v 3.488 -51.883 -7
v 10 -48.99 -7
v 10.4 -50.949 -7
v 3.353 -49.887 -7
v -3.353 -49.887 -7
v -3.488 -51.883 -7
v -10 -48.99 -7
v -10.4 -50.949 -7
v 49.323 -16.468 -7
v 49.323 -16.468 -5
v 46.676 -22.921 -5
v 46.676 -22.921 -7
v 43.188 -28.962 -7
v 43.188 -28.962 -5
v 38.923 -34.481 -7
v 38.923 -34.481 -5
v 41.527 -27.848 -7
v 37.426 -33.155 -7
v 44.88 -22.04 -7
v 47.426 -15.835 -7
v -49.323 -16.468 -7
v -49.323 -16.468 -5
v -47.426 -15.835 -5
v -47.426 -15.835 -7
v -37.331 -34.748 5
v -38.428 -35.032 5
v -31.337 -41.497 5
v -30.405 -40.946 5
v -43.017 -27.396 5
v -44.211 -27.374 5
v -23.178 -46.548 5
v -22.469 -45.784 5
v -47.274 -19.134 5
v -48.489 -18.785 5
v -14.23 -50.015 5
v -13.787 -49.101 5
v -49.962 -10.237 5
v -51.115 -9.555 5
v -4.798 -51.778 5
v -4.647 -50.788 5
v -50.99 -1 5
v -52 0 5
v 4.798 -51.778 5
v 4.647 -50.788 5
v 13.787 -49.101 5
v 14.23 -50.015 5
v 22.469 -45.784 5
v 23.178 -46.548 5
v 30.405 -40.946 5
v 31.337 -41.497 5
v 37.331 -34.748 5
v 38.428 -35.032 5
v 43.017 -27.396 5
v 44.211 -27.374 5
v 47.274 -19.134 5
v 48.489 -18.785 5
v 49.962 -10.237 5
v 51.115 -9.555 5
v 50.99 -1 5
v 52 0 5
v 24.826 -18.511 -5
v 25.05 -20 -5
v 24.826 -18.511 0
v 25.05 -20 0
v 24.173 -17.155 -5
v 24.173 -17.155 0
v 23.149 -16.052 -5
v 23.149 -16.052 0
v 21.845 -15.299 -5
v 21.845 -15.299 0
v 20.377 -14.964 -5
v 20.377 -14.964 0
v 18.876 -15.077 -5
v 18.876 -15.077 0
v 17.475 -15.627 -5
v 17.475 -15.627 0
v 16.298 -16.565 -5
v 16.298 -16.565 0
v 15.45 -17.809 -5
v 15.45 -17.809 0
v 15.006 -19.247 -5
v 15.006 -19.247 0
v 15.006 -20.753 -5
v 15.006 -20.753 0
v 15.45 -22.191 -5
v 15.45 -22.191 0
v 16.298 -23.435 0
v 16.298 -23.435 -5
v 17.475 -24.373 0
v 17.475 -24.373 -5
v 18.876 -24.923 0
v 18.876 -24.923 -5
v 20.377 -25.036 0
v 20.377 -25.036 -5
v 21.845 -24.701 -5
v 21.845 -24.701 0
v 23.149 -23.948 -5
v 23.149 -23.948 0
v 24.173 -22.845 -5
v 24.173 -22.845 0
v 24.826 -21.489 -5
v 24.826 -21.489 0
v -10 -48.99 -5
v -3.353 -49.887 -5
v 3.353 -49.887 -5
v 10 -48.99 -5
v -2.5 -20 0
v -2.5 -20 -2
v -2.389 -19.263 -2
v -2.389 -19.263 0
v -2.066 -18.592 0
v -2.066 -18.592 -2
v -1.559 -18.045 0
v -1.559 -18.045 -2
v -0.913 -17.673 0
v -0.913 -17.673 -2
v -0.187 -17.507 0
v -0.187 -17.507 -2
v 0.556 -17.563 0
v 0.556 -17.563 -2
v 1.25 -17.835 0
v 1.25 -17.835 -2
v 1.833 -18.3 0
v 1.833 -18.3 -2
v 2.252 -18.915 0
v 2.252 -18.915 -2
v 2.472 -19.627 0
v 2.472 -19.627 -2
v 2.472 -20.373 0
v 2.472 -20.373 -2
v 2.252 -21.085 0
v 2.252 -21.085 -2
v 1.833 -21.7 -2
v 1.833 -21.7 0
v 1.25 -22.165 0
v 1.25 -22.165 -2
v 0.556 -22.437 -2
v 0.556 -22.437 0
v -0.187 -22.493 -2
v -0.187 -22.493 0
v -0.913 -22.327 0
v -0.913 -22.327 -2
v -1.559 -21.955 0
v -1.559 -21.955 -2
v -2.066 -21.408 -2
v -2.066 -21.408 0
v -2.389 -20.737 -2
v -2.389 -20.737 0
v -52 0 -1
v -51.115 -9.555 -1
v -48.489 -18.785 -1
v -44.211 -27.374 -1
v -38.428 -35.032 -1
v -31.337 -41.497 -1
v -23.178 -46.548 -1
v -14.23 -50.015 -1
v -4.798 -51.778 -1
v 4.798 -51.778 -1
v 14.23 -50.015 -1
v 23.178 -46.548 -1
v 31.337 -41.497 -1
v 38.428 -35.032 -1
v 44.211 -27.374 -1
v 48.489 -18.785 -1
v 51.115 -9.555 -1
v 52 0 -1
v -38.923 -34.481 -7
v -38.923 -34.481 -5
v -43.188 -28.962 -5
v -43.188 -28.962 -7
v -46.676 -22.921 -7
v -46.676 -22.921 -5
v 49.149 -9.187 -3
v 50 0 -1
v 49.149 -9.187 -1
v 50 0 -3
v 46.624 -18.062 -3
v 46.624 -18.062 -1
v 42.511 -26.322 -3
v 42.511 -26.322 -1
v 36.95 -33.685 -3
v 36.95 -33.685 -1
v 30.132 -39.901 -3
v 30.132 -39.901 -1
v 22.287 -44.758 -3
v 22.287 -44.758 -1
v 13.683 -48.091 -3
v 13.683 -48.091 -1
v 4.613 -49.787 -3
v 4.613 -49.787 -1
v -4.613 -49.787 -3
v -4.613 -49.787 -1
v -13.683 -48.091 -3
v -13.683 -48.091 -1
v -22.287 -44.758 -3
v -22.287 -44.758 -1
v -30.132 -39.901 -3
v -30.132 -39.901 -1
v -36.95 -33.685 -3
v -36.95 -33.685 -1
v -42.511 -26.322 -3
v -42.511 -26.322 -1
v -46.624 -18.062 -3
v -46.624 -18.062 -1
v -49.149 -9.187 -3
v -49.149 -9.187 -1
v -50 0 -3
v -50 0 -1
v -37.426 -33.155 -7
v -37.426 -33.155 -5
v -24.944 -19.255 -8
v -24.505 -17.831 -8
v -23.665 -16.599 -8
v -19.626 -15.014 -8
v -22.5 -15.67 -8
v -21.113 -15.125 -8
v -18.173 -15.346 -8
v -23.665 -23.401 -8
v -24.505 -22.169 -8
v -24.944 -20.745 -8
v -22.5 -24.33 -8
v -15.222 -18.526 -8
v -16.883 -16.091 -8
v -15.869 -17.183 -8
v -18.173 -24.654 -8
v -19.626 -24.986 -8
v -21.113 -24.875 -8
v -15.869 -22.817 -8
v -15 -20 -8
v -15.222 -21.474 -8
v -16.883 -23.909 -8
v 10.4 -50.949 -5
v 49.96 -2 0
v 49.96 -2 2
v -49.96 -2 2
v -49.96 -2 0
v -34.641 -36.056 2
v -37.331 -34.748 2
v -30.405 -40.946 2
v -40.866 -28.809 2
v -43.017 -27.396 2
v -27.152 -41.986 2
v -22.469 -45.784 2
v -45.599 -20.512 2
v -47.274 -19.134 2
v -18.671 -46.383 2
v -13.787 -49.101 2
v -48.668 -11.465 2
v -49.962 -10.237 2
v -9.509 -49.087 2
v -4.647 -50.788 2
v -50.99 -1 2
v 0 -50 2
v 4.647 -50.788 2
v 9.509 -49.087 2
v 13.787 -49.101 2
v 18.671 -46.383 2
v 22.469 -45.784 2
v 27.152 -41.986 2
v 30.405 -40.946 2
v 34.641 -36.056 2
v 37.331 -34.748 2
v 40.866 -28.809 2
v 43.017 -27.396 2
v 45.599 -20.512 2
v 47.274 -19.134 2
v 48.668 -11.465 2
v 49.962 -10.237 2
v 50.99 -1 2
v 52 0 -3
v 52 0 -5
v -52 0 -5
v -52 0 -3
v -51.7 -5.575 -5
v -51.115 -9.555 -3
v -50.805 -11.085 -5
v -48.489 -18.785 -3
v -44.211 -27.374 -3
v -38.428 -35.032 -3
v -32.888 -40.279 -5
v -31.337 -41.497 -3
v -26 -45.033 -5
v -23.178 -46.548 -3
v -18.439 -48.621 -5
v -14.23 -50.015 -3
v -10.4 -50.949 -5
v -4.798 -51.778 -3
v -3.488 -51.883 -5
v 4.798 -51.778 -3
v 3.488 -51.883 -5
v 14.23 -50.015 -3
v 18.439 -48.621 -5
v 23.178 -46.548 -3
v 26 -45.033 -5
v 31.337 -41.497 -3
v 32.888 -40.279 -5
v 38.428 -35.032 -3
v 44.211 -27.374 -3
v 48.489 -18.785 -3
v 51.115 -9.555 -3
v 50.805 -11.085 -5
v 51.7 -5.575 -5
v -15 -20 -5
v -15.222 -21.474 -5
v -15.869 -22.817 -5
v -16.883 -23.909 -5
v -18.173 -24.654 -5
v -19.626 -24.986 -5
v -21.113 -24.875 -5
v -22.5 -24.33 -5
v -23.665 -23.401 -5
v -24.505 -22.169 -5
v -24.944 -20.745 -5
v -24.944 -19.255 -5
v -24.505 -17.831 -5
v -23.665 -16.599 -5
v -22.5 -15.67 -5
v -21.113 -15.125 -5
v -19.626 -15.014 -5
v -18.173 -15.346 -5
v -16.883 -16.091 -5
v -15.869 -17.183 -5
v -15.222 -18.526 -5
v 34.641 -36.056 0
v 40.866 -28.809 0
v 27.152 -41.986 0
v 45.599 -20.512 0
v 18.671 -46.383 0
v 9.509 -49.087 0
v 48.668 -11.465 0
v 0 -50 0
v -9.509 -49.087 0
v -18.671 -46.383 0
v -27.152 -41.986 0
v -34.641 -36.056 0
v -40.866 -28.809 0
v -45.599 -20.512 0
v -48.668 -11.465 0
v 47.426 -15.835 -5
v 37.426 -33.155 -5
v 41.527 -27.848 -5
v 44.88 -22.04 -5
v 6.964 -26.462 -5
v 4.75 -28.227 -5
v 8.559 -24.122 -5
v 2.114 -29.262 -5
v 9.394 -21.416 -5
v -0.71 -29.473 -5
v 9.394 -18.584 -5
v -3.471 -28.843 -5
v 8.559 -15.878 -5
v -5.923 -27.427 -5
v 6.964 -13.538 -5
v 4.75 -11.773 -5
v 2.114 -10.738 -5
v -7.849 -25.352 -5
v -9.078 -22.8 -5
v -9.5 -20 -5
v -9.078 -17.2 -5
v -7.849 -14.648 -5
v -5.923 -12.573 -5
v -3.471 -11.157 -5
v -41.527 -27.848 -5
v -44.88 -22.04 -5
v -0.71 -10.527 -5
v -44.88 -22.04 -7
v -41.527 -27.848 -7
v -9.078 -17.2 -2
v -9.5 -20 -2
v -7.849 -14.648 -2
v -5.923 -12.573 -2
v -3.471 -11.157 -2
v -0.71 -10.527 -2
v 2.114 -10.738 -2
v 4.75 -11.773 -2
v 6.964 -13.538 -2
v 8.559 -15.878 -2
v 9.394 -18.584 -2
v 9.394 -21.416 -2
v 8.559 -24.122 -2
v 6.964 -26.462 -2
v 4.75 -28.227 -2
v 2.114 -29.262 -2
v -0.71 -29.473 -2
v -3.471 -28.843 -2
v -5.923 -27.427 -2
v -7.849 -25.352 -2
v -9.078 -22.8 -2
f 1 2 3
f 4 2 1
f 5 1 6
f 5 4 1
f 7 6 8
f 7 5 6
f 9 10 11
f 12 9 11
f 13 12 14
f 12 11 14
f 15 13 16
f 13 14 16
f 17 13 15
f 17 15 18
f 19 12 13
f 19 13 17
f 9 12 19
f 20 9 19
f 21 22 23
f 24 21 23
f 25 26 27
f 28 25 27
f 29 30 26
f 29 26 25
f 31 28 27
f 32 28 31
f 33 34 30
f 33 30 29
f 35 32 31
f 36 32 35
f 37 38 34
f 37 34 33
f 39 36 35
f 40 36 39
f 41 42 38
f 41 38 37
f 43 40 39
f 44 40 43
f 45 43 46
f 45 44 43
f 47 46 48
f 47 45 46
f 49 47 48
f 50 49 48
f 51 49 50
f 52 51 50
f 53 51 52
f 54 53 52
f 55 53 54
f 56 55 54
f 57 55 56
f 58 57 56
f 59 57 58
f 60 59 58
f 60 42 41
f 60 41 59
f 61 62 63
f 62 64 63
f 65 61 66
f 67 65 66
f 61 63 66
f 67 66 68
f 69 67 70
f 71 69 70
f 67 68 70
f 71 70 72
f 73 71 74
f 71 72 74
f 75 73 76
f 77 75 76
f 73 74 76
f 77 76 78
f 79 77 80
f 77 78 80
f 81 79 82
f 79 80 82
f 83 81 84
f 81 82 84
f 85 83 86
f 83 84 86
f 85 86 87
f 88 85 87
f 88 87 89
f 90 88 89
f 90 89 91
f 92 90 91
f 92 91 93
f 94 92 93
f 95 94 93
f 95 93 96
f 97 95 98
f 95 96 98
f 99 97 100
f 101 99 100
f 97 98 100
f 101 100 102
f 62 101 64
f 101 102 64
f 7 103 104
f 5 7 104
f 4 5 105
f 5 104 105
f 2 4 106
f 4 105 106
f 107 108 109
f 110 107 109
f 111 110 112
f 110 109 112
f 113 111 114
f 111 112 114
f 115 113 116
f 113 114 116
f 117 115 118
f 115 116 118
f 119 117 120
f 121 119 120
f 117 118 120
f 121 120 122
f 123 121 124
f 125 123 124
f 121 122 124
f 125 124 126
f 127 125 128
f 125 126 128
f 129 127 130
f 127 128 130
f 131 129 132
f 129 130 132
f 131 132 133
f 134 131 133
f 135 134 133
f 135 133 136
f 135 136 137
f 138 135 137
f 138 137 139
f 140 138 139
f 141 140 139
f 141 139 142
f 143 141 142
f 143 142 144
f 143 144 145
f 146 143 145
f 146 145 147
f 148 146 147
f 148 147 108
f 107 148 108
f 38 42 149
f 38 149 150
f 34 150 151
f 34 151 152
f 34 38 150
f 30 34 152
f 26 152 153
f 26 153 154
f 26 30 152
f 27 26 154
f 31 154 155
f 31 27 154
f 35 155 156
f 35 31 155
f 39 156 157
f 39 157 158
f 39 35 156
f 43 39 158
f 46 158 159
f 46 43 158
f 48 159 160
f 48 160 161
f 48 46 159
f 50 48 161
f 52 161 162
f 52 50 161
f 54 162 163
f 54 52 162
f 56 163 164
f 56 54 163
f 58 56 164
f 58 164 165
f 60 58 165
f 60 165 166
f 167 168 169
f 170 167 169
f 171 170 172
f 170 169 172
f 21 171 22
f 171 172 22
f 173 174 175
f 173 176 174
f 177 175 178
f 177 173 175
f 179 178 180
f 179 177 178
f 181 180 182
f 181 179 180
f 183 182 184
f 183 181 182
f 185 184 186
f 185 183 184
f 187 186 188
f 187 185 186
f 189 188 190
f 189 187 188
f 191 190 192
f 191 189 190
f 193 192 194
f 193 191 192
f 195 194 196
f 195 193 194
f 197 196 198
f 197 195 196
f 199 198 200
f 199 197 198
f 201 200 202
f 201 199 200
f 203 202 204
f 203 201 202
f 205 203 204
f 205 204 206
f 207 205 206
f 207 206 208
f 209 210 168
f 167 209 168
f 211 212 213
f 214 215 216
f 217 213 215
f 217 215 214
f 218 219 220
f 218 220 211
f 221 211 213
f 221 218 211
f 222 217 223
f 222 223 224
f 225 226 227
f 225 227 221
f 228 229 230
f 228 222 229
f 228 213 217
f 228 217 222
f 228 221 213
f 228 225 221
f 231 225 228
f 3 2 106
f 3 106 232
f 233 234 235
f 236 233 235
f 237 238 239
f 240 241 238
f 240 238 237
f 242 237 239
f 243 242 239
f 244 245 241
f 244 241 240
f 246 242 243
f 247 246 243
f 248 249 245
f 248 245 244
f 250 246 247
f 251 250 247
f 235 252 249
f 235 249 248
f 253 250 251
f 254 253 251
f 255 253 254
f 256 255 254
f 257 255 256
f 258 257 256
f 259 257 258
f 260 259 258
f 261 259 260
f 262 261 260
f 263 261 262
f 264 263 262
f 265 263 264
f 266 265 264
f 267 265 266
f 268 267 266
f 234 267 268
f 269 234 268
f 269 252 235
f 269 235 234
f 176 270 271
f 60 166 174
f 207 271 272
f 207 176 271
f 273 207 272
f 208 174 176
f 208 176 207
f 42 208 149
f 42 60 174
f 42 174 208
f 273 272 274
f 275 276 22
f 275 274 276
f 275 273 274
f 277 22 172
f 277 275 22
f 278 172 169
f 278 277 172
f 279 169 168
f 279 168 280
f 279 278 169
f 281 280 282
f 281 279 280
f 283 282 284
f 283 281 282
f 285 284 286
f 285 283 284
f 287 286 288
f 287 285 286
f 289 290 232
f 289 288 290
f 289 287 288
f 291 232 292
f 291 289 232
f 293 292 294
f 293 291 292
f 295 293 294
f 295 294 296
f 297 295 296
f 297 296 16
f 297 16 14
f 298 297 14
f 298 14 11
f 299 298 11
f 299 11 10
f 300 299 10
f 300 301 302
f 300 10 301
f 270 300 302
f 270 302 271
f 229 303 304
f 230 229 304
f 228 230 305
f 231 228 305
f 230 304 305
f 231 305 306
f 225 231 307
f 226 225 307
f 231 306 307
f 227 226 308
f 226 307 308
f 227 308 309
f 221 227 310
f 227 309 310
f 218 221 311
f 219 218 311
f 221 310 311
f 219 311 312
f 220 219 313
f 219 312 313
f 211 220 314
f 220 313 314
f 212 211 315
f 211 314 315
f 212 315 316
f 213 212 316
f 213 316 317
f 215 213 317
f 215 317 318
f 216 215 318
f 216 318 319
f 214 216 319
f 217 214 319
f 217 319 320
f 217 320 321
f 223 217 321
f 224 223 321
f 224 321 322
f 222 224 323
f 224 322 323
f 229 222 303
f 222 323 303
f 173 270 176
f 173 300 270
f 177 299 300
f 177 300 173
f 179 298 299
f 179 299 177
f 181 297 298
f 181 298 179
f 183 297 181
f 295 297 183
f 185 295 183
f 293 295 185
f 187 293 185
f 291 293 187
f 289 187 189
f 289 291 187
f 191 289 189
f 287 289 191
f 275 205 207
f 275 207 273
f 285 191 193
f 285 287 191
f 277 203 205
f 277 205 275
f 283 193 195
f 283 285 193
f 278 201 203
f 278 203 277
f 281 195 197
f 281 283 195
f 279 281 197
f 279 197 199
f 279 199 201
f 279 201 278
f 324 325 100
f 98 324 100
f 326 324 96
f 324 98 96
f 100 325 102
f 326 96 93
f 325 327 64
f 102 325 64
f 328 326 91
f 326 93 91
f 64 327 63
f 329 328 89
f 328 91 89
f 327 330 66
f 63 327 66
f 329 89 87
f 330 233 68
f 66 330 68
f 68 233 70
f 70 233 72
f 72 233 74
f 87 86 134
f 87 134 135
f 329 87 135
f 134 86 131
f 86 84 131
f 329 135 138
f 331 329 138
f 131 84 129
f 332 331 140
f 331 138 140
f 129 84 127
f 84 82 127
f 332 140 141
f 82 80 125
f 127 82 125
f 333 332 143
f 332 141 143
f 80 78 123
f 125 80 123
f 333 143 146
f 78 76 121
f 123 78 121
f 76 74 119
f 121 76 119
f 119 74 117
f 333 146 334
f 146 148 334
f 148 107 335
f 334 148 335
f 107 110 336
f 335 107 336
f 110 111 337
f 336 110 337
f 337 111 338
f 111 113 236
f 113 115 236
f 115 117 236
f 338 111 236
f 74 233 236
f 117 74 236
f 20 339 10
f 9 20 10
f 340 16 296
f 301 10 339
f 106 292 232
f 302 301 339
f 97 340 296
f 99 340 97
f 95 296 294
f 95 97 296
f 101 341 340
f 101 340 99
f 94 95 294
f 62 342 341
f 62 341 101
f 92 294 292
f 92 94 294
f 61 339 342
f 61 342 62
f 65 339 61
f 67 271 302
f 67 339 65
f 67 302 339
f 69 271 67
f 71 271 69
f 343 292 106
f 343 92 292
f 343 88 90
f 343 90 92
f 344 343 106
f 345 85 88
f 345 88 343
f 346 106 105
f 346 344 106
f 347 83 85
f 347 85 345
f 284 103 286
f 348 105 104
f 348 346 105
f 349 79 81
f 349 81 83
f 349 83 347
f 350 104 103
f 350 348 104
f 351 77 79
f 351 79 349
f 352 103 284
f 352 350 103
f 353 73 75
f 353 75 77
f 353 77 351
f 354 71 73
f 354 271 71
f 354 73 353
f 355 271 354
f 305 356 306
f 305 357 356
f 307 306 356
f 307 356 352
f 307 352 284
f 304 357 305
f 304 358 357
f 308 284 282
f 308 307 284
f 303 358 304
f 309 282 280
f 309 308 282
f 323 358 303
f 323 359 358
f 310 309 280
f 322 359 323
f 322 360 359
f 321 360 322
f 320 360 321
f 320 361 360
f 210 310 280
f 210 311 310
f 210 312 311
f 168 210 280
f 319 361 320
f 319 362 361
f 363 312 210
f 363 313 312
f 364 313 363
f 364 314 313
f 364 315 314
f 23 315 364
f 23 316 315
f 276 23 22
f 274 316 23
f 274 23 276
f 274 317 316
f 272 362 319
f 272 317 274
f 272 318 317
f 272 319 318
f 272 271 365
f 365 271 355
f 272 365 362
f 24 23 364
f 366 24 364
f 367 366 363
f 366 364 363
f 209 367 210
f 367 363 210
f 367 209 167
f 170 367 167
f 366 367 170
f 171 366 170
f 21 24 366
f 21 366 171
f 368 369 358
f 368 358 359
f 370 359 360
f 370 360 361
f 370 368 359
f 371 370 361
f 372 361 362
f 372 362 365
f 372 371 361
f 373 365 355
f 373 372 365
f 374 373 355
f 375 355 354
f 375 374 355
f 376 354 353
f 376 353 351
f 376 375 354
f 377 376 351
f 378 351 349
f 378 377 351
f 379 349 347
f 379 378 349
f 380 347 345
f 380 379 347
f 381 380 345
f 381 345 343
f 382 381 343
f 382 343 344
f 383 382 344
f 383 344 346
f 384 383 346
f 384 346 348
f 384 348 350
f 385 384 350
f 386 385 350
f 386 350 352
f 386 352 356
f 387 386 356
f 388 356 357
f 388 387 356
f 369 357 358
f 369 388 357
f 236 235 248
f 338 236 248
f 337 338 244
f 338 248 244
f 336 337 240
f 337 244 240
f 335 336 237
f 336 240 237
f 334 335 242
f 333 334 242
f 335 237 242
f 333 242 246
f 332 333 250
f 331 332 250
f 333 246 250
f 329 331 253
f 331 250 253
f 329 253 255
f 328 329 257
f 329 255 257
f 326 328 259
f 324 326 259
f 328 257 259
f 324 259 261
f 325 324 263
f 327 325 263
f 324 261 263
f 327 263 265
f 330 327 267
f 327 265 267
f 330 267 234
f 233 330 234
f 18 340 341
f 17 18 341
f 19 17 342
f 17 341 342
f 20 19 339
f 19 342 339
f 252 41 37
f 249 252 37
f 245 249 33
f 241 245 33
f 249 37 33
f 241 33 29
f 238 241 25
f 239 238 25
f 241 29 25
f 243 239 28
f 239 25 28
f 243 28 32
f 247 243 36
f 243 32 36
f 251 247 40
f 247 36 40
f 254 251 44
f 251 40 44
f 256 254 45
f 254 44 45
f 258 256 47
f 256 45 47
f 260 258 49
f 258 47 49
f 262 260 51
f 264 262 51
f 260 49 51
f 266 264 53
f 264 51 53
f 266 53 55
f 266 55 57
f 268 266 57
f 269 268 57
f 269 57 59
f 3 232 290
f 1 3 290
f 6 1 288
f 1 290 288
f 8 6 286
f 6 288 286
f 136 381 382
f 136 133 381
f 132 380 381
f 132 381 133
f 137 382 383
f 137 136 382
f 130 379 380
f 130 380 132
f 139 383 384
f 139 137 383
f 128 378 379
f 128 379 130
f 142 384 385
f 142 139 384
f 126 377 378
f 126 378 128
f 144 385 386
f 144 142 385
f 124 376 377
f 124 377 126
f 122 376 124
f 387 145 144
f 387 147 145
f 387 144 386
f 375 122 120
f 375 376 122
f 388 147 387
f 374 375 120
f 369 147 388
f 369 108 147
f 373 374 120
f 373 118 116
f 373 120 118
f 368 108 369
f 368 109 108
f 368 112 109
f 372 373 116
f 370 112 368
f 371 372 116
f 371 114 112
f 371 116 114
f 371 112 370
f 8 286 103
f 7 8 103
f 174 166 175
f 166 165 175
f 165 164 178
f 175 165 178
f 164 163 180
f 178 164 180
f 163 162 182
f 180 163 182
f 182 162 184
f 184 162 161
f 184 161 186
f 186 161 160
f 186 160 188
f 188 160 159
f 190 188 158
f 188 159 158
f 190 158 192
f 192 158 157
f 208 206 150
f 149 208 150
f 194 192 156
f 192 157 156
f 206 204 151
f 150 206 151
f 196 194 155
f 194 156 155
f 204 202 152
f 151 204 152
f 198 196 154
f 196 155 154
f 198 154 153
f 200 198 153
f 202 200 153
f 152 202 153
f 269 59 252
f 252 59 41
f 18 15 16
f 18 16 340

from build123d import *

# Parameters (mm, degrees)
SKETCH1_R           = 5.05
BOSS_EXTRUDE1_DEPTH = 5
BOSS_EXTRUDE2_START = 5
BOSS_EXTRUDE2_DEPTH = 5
BOSS_EXTRUDE4_DEPTH = 2
CUT_EXTRUDE1_START  = -3
SKETCH6_R           = 9.5
SKETCH6_R_2         = 5.05
CUT_EXTRUDE1_DEPTH  = 3
SKETCH7_R           = 2.5
CUT_EXTRUDE2_DEPTH  = 74.87151007
SKETCH8_R           = 5
BOSS_EXTRUDE5_DEPTH = 3
CUT_EXTRUDE3_DEPTH  = 3
SKETCH10_W          = 8.596273884
SKETCH10_H          = 2
CUT_REVOLVE1_ANGLE  = 180


with BuildPart() as part:
    # Sketch1 → Boss-Extrude1 (new body)
    with BuildSketch(Plane.XY):
        with BuildLine():
            Line((-52, 0), (52, 0))
            ThreePointArc((52, 0), (0, -52), (-52, 0))
        make_face()
        with Locations((20, -20)):
            Circle(SKETCH1_R, mode=Mode.SUBTRACT)
    extrude(amount=-BOSS_EXTRUDE1_DEPTH)

    # Sketch2 → Boss-Extrude2 (add)
    with BuildSketch(Plane.XY.offset(BOSS_EXTRUDE2_START)):
        with BuildLine():
            Line((52, 0), (-52, 0))
            ThreePointArc((-52, 0), (0, -52), (52, 0))
        make_face()
        with BuildLine():
            Line((49.959983987, -2), (-49.959983987, -2))
            ThreePointArc((-49.959983987, -2), (0, -50), (49.959983987, -2))
        make_face(mode=Mode.SUBTRACT)
    extrude(amount=-BOSS_EXTRUDE2_DEPTH)

    # Sketch5 → Boss-Extrude4 (add)
    with BuildSketch(Plane(origin=(0, 0, -5), x_dir=(-1, 0, 0), z_dir=(0, 0, -1))):
        with BuildLine():
            ThreePointArc((-49.323463146, -16.468029126), (-45.033320997, -26), (-38.923463146, -34.481357524))
            Line((-38.923463146, -34.481357524), (-37.426406871, -33.155151466))
            ThreePointArc((-37.426406871, -33.155151466), (-43.301270189, -25), (-47.426406871, -15.83464339))
            Line((-47.426406871, -15.83464339), (-49.323463146, -16.468029126))
        make_face()
        with BuildLine():
            Line((10.4, -50.94938665), (10, -48.989794856))
            ThreePointArc((10, -48.989794856), (0, -50), (-10, -48.989794856))
            Line((-10, -48.989794856), (-10.4, -50.94938665))
            ThreePointArc((-10.4, -50.94938665), (0, -52), (10.4, -50.94938665))
        make_face()
        with BuildLine():
            Line((37.426406871, -33.155151466), (38.923463146, -34.481357524))
            ThreePointArc((38.923463146, -34.481357524), (45.033320997, -26), (49.323463146, -16.468029126))
            Line((49.323463146, -16.468029126), (47.426406871, -15.83464339))
            ThreePointArc((47.426406871, -15.83464339), (43.301270189, -25), (37.426406871, -33.155151466))
        make_face()
    extrude(amount=BOSS_EXTRUDE4_DEPTH)

    # Sketch6 → Cut-Extrude1 (cut)
    with BuildSketch(Plane(origin=(0, 0, -5), x_dir=(-1, 0, 0), z_dir=(0, 0, -1)).offset(CUT_EXTRUDE1_START)):
        with Locations((0, -20)):
            Circle(SKETCH6_R)
        with Locations(Location((-20, -20, 0), (0, 0, 180))):
            Circle(SKETCH6_R_2)
    extrude(amount=CUT_EXTRUDE1_DEPTH, mode=Mode.SUBTRACT)

    # Sketch7 → Cut-Extrude2 (cut, through all)
    with BuildSketch(Plane(origin=(0, 0, -2), x_dir=(-1, 0, 0), z_dir=(0, 0, -1))):
        with Locations((0, -20)):
            Circle(SKETCH7_R)
    extrude(amount=-CUT_EXTRUDE2_DEPTH, mode=Mode.SUBTRACT)

    # Sketch8 → Boss-Extrude5 (add)
    with BuildSketch(Plane(origin=(0, 0, -5), x_dir=(-1, 0, 0), z_dir=(0, 0, -1))):
        with Locations(Location((20, -20, 0), (0, 0, 180))):
            Circle(SKETCH8_R)
    extrude(amount=BOSS_EXTRUDE5_DEPTH)

    # Sketch9 → Cut-Extrude3 (cut)
    # profile 1 of 2: a face of its own
    with BuildSketch(Plane.XY.offset(5)):
        with BuildLine():
            Line((50.990195136, -1), (-50.990195136, -1))
            ThreePointArc((-50.990195136, -1), (0, -51), (50.990195136, -1))
        make_face()
        with BuildLine():
            ThreePointArc((49.959983987, -2), (0, -50), (-49.959983987, -2))
            Line((-49.959983987, -2), (49.959983987, -2))
        make_face(mode=Mode.SUBTRACT)
    # profile 2 of 2: a face of its own
    with BuildSketch(Plane.XY.offset(5)):
        with BuildLine():
            Line((-49.959983987, -2), (49.959983987, -2))
            ThreePointArc((49.959983987, -2), (0, -50), (-49.959983987, -2))
        make_face()
    extrude(amount=-CUT_EXTRUDE3_DEPTH, mode=Mode.SUBTRACT)

    # Sketch10 → Cut-Revolve1 (revolve, cut)
    with BuildSketch(Plane(origin=(0, 0, 0), x_dir=(1, 0, 0), z_dir=(0, 1, 0))):
        with Locations((54.298136942, 2)):
            Rectangle(SKETCH10_W, SKETCH10_H)
    revolve(axis=Axis((0, 0, -7.000025), (0, 0, -1)), revolution_arc=CUT_REVOLVE1_ANGLE, mode=Mode.SUBTRACT)


solid = part.part
